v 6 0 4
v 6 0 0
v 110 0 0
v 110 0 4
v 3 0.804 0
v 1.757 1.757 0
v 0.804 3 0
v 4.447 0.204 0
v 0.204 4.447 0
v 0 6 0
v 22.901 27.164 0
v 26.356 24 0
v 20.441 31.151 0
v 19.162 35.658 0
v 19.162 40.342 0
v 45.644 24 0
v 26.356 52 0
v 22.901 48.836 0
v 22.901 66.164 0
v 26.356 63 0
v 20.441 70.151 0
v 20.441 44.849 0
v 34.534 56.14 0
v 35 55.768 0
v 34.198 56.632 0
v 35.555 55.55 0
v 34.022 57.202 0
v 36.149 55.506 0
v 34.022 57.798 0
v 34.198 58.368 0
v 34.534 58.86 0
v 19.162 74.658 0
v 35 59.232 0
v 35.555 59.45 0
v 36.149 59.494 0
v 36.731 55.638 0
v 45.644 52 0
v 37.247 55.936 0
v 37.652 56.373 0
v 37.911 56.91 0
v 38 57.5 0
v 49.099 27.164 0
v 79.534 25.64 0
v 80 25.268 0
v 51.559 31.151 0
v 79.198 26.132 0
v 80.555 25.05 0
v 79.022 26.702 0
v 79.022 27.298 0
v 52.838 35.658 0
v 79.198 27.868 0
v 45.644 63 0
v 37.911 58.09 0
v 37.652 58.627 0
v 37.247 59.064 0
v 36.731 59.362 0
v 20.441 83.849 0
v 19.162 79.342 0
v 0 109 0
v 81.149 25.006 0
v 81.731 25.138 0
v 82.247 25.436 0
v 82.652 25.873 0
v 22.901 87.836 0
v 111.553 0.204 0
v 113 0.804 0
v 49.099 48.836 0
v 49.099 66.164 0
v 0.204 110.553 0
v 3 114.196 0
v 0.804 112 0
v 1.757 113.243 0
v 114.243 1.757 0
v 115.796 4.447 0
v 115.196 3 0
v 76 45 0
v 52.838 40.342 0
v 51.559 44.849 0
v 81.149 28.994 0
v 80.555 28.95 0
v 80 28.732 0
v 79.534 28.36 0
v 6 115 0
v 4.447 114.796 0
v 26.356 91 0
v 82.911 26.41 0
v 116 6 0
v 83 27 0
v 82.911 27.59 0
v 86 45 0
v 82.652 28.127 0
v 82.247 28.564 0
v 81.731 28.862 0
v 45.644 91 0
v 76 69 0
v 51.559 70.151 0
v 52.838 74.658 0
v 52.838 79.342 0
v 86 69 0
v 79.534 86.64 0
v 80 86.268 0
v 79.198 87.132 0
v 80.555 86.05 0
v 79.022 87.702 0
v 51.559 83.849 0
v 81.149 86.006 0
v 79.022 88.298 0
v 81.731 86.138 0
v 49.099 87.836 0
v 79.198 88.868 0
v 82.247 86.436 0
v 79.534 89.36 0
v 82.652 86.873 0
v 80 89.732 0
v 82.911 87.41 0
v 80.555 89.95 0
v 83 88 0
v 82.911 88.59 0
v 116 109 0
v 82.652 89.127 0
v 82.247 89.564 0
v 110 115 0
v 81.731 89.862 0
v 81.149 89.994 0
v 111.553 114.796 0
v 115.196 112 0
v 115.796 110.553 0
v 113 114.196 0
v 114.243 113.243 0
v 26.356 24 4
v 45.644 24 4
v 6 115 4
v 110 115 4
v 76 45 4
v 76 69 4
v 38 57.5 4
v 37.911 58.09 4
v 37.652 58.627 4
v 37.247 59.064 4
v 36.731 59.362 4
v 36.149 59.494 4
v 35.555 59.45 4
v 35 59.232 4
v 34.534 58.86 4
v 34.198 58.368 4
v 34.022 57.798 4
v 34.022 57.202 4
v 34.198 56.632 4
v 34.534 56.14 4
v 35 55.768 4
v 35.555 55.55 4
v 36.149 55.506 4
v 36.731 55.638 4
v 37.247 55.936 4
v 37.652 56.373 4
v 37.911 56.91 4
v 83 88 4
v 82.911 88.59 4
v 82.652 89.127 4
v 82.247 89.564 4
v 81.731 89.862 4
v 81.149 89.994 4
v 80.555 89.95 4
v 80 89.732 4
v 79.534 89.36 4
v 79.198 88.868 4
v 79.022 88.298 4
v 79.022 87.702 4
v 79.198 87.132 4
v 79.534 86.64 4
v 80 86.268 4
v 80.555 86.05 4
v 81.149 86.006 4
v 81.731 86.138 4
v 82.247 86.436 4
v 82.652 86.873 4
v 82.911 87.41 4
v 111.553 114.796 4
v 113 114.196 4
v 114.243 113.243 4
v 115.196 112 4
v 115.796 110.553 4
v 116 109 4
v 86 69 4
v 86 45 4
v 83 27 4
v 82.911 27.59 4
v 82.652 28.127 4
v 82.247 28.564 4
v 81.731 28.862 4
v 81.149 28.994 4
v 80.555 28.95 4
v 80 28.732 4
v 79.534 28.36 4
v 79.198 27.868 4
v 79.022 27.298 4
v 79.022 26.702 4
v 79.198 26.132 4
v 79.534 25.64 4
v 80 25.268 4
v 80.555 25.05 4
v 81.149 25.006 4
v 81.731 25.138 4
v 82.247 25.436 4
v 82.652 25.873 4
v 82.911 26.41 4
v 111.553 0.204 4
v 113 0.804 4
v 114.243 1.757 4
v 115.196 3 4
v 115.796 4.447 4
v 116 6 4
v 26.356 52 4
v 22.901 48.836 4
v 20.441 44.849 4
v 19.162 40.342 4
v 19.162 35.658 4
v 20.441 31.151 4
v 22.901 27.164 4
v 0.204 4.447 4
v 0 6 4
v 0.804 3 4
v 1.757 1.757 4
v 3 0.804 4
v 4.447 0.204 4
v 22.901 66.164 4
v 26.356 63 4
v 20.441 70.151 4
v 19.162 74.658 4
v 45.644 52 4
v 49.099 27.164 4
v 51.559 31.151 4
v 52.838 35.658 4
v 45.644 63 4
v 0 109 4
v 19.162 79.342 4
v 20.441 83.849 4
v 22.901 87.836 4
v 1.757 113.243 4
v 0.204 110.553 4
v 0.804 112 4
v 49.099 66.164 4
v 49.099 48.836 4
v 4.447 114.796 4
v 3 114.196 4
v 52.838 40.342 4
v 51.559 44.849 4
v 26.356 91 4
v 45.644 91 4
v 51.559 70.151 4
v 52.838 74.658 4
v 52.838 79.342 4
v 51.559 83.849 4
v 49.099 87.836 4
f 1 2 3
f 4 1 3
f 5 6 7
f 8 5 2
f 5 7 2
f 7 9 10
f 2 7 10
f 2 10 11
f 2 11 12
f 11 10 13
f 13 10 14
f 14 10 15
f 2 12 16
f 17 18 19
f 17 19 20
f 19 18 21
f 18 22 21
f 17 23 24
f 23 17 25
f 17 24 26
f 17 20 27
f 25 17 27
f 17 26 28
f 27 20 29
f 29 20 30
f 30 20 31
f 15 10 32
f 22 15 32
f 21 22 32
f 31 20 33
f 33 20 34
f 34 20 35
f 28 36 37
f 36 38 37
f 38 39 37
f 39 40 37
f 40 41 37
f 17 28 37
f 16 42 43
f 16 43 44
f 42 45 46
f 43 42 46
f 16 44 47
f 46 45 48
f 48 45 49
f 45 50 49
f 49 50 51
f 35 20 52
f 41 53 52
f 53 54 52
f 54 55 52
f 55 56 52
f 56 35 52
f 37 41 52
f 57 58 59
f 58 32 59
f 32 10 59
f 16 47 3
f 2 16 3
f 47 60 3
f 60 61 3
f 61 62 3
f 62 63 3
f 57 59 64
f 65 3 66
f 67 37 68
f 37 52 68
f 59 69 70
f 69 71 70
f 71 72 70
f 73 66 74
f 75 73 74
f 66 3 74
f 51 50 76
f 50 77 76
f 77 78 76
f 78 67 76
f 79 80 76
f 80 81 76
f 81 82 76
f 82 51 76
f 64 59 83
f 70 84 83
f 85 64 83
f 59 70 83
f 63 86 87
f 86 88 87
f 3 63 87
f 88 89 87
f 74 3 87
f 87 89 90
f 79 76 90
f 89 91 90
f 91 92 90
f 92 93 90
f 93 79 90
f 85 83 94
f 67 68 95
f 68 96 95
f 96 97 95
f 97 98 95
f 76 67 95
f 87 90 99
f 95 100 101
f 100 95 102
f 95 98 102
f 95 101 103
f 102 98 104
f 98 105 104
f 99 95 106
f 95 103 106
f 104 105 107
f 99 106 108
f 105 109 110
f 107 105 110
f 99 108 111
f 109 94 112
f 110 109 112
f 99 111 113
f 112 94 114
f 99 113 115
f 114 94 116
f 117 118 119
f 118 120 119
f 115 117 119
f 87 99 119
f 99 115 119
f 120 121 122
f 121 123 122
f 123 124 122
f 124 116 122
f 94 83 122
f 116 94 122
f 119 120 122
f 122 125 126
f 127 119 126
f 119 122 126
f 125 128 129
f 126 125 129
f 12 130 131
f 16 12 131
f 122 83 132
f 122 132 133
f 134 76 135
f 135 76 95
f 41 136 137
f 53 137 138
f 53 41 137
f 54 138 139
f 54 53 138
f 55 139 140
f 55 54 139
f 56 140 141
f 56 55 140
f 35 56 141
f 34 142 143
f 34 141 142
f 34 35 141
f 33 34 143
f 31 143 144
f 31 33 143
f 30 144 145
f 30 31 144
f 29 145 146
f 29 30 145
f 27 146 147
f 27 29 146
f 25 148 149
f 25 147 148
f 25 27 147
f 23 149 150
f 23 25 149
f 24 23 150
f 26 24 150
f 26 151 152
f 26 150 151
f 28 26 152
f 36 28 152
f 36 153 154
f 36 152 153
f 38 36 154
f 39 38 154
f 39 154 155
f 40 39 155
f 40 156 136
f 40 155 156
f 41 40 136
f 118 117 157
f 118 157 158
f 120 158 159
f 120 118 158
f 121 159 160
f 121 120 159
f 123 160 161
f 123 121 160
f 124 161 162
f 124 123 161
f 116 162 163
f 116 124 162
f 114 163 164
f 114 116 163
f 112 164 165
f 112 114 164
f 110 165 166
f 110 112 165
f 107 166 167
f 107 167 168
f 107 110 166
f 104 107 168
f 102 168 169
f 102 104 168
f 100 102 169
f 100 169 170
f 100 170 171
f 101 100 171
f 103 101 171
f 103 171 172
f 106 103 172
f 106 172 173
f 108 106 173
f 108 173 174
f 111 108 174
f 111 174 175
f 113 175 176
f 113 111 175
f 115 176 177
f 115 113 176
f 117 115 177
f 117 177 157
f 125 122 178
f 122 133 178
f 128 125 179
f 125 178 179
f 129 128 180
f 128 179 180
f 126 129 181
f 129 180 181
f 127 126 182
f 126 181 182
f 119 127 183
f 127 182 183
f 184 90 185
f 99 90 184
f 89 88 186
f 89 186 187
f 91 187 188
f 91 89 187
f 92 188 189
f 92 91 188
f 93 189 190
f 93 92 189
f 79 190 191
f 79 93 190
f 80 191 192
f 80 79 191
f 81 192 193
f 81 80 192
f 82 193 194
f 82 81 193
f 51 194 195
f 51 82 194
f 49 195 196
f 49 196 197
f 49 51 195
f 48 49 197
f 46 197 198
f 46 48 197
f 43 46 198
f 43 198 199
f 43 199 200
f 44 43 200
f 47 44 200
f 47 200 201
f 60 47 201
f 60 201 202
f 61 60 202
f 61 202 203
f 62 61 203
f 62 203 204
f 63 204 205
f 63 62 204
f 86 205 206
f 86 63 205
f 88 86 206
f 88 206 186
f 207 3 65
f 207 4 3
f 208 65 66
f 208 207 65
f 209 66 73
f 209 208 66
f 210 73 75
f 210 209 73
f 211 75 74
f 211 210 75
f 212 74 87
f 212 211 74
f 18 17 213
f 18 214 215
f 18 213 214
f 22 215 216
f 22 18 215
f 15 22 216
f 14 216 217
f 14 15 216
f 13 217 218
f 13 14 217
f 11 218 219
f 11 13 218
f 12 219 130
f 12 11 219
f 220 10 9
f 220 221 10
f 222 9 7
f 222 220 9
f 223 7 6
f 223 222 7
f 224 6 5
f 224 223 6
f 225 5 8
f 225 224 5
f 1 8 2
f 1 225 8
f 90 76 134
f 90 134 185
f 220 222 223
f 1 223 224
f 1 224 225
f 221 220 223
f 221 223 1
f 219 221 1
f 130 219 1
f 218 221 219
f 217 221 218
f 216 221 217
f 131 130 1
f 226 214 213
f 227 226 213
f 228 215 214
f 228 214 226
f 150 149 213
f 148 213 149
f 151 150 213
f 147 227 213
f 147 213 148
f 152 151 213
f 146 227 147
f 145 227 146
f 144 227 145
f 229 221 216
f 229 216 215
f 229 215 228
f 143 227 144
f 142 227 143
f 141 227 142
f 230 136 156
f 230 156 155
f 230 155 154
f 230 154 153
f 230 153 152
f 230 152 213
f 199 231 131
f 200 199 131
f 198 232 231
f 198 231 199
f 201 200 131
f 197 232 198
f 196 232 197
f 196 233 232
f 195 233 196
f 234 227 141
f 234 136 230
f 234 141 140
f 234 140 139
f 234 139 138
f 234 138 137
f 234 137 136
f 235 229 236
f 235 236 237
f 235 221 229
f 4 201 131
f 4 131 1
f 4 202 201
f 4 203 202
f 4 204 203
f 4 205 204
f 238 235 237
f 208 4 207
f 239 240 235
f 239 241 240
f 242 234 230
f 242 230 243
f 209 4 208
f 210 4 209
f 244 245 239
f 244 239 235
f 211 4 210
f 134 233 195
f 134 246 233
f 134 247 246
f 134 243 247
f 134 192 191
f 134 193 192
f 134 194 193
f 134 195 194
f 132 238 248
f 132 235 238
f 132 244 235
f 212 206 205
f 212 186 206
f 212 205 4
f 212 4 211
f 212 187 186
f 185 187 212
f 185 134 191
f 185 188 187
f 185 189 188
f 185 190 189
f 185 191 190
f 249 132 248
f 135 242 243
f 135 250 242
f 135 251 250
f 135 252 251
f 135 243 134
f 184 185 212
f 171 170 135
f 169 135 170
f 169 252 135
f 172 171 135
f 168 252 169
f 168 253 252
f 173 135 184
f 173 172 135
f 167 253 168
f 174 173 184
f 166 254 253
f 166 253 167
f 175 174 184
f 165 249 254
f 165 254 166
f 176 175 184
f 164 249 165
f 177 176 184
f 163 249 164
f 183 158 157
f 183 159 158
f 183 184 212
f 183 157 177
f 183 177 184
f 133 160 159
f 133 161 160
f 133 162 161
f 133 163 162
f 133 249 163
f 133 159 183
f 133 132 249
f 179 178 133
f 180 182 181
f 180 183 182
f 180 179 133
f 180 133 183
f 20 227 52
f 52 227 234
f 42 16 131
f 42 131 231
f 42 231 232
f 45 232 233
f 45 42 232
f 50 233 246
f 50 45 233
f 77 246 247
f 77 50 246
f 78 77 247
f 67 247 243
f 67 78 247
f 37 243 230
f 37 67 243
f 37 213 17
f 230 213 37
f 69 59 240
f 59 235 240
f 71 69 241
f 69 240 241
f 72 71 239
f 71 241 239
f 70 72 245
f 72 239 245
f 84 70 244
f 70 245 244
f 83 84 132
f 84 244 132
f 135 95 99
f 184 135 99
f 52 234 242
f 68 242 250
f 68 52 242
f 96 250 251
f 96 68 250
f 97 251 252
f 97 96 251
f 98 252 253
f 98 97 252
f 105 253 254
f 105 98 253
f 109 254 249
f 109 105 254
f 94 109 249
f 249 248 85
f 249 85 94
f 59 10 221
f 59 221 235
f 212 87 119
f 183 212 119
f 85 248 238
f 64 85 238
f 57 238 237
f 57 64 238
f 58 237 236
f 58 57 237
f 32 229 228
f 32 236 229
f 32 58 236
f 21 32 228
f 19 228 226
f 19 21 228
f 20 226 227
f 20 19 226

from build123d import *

# Parameters (mm, degrees)
F0_W     = 116
F0_H     = 115
F0_R     = 2
F0_W_2   = 10
F0_H_2   = 24
F1_DEPTH = 4
F2_R     = 6
F4_R     = 2
F4_R_2   = 17
F5_DEPTH = 25
F6_W     = 27.550638
F6_H     = 3.205147
F6_W_2   = 29.028984
F6_H_2   = 3.037915
F6_W_3   = 33.224199
F6_H_3   = 3
F7_DEPTH = 4


with BuildPart() as f1:
    # F0 (on Top) → F1 (new body)
    with BuildSketch(Plane.XY):
        with Locations((58, 57.5)):
            Rectangle(F0_W, F0_H)
        with Locations((81, 27)):
            Circle(F0_R, mode=Mode.SUBTRACT)
        with Locations((81, 57)):
            Rectangle(F0_W_2, F0_H_2, mode=Mode.SUBTRACT)
        with Locations((81, 88)):
            Circle(F0_R, mode=Mode.SUBTRACT)
    extrude(amount=F1_DEPTH)

    # F2
    f2_edges = [f1.edges().sort_by_distance(p)[0] for p in [
        (0, 115, 2),
        (116, 115, 2),
        (116, 0, 2),
        (0, 0, 2),
    ]]
    fillet(f2_edges, radius=F2_R)

    # F4 (on Top) → F5 (cut)
    with BuildSketch(Plane.XY):
        with Locations((36, 57.5)):
            Circle(F4_R)
        with Locations((36, 77)):
            Circle(F4_R_2)
        with Locations((36, 38)):
            Circle(F4_R_2)
    extrude(amount=F5_DEPTH, mode=Mode.SUBTRACT)

    # F6 (on face) → F7 (join)
    with BuildSketch(Plane.XY.offset(4)):
        Polygon((32.74464, 94.836249), (25.32669, 91), (46.063566, 91), (43.255925, 94.420469), align=None)
        with Locations((37.412647, 61.397426)):
            Rectangle(F6_W, F6_H)
        with Locations((37.197317, 53.518957)):
            Rectangle(F6_W_2, F6_H_2)
        with Locations((36.739217, 22.5)):
            Rectangle(F6_W_3, F6_H_3)
    extrude(amount=-F7_DEPTH)


solid = f1.part
